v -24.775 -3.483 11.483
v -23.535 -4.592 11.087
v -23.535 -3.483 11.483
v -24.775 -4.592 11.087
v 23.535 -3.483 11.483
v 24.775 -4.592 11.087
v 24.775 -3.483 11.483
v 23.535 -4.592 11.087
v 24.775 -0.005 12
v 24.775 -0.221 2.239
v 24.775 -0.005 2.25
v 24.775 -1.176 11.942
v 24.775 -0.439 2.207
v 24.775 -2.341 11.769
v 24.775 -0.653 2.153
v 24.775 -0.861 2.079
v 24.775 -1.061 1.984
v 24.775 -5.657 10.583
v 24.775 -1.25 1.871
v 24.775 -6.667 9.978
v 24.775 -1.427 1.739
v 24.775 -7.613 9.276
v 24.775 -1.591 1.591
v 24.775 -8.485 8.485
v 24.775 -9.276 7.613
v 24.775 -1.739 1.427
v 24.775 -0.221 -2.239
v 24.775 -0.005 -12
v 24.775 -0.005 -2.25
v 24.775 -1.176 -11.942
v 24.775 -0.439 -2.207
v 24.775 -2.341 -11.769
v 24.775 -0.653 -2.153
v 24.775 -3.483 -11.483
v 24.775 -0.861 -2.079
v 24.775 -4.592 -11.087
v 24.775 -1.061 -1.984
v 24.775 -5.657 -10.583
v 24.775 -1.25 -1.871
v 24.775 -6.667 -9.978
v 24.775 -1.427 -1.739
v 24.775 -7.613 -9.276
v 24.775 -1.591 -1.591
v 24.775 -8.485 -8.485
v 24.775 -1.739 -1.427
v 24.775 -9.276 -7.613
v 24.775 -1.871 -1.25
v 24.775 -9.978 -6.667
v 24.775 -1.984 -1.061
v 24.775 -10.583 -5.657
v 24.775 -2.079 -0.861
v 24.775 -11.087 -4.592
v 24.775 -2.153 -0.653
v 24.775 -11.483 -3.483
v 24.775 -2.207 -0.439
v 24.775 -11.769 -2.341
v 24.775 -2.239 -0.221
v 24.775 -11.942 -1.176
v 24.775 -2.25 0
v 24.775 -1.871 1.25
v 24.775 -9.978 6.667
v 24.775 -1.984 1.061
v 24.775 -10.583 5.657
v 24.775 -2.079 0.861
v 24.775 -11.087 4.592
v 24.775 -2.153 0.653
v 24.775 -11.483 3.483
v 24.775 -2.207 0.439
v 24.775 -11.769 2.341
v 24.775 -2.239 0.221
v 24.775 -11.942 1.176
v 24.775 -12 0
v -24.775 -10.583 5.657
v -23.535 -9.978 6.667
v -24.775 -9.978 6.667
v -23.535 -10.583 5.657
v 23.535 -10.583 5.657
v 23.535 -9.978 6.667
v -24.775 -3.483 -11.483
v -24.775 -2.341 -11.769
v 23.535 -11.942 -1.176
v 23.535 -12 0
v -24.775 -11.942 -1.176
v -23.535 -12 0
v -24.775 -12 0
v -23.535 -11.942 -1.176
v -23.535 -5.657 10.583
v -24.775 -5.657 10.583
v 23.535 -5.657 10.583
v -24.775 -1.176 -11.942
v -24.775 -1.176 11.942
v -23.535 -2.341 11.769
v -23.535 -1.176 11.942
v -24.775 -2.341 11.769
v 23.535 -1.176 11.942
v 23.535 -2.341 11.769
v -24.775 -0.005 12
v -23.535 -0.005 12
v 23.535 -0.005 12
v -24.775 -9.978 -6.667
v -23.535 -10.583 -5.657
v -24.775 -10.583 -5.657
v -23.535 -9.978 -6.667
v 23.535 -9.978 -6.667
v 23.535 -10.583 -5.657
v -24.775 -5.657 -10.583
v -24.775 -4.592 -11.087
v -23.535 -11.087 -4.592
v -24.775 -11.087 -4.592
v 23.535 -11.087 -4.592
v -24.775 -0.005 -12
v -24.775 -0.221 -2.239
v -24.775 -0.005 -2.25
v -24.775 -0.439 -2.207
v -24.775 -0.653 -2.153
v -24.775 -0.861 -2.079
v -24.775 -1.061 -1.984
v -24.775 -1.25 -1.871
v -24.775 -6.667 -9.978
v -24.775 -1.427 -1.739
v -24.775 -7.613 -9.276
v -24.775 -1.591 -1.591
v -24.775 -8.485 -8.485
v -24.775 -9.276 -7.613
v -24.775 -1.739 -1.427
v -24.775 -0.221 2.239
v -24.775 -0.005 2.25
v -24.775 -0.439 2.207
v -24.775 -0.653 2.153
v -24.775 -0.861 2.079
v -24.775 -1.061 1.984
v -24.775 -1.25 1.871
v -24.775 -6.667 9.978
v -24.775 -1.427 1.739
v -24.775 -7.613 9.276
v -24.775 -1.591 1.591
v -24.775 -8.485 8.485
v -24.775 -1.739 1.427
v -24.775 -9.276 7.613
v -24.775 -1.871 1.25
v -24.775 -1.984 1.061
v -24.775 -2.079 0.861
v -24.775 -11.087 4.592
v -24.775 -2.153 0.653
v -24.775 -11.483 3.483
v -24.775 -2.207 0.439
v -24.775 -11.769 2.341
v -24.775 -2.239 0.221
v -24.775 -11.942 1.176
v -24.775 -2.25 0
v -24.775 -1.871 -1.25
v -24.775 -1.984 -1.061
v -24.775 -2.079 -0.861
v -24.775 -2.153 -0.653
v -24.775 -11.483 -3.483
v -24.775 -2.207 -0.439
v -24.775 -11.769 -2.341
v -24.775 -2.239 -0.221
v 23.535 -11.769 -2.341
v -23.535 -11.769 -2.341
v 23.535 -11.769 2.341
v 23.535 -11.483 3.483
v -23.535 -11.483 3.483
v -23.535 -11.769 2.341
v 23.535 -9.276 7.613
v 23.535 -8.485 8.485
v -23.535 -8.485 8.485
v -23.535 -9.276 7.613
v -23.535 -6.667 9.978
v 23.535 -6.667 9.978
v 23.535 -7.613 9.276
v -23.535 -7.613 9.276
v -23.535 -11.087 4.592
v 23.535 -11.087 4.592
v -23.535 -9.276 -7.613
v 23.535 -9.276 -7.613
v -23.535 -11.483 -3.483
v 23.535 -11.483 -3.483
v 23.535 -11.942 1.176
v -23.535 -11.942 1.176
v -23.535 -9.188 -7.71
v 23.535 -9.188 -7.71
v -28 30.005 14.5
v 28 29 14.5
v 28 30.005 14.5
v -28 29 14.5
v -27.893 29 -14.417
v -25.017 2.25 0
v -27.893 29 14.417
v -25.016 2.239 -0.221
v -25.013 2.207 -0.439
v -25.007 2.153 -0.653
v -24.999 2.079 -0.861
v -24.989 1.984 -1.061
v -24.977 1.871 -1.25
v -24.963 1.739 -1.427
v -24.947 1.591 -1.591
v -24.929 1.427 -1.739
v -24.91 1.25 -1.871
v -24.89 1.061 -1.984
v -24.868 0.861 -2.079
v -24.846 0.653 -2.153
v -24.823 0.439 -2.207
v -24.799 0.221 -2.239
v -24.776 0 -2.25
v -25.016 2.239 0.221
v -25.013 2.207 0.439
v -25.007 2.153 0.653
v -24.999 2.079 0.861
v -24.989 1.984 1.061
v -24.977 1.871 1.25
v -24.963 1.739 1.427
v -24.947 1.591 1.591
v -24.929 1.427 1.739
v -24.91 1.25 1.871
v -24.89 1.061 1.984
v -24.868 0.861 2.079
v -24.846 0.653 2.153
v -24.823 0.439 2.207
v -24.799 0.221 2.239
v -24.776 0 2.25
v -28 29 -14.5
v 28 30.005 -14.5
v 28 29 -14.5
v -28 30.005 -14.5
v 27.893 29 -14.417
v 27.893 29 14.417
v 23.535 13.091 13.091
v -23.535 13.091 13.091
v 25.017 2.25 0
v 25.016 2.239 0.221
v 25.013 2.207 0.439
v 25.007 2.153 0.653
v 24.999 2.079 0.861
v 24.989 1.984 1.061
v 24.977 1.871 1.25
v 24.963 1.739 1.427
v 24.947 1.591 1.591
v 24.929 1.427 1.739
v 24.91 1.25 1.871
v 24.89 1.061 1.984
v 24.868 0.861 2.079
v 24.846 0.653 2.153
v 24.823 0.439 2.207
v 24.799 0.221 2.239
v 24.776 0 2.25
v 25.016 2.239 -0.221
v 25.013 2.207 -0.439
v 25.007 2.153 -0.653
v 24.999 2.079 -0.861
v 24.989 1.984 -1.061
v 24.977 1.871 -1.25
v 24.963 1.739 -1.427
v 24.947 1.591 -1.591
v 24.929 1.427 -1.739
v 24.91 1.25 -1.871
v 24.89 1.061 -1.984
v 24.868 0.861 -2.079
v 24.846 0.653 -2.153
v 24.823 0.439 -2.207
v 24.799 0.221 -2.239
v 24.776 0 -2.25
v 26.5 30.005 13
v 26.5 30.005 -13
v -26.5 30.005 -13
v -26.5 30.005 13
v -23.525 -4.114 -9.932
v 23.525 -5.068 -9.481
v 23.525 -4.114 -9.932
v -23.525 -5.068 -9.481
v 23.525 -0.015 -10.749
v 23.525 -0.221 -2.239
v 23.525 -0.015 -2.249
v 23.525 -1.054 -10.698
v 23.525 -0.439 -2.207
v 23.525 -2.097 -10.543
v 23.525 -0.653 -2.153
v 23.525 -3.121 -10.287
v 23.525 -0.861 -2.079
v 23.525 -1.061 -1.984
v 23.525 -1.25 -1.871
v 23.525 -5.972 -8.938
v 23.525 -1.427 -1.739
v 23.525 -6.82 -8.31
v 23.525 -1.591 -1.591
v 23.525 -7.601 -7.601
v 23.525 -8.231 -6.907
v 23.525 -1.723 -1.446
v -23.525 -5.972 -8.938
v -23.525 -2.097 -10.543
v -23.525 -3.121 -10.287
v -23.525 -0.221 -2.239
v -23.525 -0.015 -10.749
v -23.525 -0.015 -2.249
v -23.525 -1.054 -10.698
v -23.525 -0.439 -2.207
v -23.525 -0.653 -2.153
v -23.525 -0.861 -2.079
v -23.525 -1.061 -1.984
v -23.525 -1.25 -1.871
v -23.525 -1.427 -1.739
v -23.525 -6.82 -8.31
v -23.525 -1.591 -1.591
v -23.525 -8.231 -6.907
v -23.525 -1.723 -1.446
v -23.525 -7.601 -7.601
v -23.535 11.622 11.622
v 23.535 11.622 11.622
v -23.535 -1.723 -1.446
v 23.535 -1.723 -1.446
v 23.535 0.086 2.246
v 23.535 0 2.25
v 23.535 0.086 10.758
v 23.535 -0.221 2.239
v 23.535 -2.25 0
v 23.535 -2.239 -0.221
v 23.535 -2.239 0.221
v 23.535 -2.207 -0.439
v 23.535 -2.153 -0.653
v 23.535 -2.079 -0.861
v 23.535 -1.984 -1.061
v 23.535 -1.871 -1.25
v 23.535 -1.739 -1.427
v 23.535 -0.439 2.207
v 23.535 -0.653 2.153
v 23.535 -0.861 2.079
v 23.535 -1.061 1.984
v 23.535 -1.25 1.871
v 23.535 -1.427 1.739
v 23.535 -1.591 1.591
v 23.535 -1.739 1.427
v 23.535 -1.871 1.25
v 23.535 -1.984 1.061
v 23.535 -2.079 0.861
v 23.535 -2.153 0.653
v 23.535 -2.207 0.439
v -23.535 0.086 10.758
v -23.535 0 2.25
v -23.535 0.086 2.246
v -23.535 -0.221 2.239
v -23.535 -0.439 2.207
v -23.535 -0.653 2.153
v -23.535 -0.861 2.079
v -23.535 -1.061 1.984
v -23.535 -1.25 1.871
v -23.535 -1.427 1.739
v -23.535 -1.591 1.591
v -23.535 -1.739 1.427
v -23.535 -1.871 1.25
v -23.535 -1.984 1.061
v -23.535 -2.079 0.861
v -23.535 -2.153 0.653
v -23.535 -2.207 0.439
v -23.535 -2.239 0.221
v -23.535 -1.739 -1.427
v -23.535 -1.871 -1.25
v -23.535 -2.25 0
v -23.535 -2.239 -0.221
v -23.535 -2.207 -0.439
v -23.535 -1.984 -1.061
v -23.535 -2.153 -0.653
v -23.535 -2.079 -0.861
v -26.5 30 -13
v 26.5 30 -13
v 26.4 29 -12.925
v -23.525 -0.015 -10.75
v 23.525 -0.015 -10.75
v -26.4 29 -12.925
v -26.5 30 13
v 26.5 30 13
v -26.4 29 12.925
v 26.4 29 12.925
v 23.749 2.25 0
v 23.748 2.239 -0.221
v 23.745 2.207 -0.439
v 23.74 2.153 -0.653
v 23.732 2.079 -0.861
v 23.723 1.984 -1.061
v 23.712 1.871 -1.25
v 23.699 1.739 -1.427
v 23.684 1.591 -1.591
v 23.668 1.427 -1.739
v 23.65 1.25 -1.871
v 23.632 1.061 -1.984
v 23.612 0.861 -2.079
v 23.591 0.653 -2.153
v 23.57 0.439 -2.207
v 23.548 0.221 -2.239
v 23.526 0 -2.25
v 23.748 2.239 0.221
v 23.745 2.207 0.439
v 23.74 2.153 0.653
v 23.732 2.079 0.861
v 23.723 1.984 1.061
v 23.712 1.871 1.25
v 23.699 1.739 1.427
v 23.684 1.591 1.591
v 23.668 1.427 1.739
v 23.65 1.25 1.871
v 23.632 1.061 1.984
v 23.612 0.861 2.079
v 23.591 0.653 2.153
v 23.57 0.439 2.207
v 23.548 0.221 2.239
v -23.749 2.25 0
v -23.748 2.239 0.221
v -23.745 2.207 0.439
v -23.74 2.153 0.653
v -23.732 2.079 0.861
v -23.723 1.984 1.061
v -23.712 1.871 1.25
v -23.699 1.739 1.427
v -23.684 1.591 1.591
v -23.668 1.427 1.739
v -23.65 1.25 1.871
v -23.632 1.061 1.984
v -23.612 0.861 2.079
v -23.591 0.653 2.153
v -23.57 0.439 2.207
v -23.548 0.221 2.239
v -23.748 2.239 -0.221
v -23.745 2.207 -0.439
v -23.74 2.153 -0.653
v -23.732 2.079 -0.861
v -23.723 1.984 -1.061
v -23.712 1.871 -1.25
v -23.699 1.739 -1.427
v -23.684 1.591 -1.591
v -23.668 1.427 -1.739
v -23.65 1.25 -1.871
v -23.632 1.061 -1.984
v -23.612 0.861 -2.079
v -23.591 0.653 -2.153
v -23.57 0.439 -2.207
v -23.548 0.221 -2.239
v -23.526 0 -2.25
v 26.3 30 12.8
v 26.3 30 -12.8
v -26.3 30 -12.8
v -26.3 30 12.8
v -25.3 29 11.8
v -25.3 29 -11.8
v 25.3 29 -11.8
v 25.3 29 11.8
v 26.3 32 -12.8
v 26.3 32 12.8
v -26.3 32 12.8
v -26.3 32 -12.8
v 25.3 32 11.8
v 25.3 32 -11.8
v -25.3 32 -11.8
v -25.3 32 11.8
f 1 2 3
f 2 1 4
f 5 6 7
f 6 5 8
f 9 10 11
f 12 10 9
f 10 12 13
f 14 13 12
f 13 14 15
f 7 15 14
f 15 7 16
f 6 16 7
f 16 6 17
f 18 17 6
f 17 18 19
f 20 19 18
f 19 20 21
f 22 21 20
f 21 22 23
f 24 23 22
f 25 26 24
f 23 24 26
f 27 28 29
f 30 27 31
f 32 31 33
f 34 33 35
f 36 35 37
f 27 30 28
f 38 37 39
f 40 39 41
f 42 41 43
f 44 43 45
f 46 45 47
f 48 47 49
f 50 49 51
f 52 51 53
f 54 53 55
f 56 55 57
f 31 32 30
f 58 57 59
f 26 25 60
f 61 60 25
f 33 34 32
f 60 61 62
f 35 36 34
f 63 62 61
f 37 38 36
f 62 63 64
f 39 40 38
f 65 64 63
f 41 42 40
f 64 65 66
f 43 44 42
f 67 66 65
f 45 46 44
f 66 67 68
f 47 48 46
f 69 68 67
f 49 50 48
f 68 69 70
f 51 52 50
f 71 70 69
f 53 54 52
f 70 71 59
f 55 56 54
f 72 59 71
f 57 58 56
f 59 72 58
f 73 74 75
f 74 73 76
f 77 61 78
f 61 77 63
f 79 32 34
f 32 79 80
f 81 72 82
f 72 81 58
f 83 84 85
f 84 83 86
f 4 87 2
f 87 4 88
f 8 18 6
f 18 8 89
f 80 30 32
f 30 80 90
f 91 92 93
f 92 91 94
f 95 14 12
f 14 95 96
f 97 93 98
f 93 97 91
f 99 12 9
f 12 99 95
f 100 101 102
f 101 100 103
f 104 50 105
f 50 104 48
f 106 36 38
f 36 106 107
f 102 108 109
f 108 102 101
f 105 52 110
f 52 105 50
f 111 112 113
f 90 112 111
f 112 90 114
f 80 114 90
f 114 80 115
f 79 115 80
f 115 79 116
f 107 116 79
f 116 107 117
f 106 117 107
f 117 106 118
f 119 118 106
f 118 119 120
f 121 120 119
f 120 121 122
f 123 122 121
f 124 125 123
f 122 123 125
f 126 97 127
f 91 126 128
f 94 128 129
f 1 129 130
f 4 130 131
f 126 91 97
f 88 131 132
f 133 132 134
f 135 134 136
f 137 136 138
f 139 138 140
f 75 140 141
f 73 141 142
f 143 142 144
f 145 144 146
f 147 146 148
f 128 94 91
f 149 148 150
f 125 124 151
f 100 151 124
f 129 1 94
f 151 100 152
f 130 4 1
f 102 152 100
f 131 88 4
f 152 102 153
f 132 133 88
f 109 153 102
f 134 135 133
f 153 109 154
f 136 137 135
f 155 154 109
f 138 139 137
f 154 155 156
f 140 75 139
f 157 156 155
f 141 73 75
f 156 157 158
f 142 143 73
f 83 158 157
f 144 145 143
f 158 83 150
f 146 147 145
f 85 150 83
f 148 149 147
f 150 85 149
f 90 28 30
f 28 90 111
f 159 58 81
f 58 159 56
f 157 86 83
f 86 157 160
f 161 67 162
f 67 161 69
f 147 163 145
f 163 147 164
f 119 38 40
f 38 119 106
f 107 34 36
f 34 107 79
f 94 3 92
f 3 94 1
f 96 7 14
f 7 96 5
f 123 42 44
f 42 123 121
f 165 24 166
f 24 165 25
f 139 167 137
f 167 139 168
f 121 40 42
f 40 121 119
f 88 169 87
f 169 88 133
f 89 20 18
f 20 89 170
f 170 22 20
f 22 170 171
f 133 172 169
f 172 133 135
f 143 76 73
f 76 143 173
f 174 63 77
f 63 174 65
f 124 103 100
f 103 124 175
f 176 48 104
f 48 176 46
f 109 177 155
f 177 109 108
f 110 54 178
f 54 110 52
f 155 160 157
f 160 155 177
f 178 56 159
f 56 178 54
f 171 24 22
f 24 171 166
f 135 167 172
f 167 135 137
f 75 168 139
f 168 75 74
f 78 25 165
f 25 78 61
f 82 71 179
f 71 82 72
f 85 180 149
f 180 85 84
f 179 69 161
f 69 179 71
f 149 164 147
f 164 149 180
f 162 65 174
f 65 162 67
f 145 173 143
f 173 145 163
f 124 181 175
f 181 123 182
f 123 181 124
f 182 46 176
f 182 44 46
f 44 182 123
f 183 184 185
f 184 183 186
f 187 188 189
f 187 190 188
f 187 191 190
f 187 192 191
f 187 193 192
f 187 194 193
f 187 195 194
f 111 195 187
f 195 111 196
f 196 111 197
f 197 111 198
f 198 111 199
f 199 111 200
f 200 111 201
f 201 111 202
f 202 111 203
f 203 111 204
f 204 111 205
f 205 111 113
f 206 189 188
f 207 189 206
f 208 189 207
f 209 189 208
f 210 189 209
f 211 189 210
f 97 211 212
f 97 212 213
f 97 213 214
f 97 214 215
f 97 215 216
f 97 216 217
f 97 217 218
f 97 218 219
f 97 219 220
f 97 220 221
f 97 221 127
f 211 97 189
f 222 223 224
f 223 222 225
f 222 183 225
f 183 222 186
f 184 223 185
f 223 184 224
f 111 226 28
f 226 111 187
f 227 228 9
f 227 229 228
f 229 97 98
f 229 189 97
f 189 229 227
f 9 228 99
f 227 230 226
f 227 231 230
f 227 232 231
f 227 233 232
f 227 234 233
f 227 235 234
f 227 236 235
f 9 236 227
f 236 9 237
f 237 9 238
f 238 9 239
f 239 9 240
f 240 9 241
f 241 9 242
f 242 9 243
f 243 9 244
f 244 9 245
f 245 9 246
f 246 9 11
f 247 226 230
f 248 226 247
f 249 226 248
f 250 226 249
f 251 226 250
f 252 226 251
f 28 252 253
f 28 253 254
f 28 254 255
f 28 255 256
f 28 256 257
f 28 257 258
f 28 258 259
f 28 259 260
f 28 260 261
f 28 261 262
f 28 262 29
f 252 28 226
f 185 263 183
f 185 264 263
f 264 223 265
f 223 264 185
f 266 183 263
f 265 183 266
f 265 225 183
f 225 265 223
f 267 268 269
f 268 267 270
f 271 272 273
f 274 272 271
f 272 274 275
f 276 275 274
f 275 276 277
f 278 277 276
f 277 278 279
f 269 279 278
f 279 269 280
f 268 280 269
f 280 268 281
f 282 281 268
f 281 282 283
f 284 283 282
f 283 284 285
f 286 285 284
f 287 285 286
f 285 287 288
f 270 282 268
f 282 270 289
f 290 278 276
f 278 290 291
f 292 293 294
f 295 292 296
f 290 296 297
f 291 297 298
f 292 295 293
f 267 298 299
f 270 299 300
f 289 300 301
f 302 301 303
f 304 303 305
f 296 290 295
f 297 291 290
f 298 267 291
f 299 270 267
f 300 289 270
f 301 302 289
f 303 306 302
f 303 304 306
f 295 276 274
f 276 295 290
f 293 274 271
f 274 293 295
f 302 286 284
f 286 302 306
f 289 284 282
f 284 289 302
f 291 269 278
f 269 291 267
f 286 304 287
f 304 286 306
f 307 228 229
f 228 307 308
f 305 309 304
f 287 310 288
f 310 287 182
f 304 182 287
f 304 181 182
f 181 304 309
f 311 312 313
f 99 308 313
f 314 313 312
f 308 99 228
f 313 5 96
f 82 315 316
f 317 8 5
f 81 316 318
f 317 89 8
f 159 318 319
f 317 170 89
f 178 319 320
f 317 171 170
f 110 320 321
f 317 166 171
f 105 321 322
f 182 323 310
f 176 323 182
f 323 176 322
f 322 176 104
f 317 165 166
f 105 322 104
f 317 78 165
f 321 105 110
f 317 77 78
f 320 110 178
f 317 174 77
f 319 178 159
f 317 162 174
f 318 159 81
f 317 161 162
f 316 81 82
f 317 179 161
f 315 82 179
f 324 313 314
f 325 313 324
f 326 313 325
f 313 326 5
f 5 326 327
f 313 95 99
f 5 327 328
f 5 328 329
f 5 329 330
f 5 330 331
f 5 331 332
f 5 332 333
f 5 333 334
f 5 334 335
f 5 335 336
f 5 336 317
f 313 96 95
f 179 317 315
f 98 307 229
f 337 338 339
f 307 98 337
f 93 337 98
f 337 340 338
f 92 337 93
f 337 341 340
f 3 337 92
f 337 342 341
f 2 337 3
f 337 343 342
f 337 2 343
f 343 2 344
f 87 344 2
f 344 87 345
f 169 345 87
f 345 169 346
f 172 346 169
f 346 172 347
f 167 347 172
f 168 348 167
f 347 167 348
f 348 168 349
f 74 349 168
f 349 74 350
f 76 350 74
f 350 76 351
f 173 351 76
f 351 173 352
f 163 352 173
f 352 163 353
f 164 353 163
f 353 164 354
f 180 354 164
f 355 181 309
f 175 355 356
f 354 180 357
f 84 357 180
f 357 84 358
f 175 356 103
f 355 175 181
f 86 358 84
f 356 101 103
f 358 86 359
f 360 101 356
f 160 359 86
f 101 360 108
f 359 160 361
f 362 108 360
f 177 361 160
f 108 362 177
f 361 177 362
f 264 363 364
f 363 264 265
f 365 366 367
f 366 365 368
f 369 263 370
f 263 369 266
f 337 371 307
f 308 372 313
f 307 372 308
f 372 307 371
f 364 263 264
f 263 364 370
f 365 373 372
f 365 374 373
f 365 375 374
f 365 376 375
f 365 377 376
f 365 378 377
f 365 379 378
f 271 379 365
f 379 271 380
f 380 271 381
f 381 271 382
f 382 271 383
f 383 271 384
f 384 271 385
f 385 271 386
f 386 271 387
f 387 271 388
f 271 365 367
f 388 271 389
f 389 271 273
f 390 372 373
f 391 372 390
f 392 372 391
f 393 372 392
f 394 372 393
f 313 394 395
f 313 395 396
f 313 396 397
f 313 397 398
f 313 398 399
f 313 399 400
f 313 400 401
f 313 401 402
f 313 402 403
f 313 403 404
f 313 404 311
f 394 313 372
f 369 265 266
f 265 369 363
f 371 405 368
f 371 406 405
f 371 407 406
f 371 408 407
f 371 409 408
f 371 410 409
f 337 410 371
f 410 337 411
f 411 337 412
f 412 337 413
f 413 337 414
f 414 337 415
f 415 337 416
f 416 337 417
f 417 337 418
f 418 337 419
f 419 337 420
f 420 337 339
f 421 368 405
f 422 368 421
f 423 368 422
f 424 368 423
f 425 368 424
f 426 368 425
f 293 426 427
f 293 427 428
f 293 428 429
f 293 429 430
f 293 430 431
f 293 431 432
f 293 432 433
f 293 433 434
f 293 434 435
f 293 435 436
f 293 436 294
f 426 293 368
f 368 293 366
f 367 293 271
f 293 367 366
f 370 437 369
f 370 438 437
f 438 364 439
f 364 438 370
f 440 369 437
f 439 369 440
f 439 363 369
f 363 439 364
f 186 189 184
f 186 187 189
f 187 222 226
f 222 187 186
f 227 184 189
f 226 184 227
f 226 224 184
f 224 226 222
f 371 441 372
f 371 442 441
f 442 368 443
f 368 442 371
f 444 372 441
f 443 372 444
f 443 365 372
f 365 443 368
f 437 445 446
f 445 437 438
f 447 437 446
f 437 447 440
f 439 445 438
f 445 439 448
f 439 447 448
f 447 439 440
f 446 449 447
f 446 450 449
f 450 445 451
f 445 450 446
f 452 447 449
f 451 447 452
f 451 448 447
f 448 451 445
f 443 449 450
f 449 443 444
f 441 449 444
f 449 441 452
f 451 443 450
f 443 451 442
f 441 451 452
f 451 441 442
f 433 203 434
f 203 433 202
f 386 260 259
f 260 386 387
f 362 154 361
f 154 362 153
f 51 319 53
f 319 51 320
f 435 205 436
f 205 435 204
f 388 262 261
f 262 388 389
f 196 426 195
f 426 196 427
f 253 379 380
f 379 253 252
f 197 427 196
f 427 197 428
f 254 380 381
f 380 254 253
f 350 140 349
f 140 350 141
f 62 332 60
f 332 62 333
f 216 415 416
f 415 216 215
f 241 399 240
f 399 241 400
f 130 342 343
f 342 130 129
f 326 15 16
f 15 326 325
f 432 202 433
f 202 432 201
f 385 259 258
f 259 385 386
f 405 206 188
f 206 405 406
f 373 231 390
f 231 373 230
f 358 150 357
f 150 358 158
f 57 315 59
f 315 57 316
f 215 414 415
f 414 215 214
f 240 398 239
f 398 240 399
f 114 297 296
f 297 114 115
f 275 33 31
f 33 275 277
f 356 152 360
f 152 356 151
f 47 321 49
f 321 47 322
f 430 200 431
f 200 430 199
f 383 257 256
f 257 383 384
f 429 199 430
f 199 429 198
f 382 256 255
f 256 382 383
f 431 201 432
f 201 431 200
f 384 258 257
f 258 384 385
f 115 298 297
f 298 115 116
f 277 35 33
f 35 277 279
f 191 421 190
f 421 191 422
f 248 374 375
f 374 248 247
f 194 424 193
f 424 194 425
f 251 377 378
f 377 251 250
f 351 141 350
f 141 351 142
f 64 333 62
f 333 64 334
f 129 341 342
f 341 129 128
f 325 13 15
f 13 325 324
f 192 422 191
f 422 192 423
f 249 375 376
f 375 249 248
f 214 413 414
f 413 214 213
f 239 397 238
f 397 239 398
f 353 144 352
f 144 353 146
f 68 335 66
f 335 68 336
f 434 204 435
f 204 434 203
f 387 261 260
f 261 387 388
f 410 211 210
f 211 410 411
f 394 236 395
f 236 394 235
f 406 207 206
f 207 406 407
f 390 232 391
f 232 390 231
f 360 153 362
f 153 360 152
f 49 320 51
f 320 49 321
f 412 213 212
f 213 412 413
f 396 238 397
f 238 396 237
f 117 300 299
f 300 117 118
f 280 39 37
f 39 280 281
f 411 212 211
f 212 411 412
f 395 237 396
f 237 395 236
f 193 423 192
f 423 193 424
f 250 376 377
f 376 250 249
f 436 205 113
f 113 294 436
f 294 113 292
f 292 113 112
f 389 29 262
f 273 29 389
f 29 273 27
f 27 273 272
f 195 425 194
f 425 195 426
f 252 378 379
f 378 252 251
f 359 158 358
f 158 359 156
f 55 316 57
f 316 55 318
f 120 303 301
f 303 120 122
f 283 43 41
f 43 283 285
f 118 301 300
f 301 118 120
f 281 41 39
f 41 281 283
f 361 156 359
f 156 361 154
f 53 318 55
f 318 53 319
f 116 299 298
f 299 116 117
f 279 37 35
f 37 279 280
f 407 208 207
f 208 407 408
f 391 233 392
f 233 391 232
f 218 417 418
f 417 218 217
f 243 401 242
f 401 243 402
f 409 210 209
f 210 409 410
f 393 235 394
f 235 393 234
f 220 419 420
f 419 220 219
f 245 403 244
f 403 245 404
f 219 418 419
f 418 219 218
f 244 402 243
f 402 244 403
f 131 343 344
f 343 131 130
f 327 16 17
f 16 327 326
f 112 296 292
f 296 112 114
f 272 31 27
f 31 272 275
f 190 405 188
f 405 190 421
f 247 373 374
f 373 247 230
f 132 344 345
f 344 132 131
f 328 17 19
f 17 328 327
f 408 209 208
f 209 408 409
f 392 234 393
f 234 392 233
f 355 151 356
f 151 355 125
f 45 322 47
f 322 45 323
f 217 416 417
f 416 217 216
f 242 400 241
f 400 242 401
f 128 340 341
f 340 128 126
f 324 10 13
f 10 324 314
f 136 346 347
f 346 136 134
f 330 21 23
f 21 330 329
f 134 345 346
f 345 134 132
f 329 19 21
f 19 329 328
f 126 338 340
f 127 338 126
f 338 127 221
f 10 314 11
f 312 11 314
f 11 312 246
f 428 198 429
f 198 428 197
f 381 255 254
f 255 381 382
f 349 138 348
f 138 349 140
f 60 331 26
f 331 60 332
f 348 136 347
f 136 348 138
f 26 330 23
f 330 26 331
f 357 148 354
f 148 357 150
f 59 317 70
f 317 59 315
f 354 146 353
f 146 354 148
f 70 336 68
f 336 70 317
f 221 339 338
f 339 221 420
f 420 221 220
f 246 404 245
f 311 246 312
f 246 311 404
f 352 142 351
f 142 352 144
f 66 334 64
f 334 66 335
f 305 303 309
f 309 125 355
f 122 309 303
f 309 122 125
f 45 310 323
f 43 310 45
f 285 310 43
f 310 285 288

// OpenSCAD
// Articulated rectangular cable channel

OUTPUT = "arm_2"; // "assembly", "arm_1", "arm_2", or "print"

CHANNEL_ANGLE = 75;

// Angles are measured from each arm's centerline in the positive bend direction.
ARM_1_HUB_OPENING_START_ANGLE =50;
ARM_1_HUB_OPENING_END_ANGLE = 180;
ARM_2_HUB_OPENING_START_ANGLE = 45;
ARM_2_HUB_OPENING_END_ANGLE = 220;

ARM_1_LENGTH = 25;
ARM_1_WIDTH = 40;
ARM_1_HEIGHT = 14;
ARM_1_WALL_THICKNESS = 1;
ARM_1_LIP_LENGTH = 0;
ARM_1_LIP_WALL_THICKNESS = 1;
ARM_1_LIP_CLEARANCE = 0.2;

ARM_2_LENGTH = 30;
ARM_2_WIDTH = 56;
ARM_2_HEIGHT = 29;
ARM_2_WALL_THICKNESS = 1.5;
ARM_2_LIP_LENGTH = 2;
ARM_2_LIP_WALL_THICKNESS = 1;
ARM_2_LIP_CLEARANCE = 0.2;

BOLT_HOLE_DIAMETER = 4.5;
BOLT_HOLE_CUT_MARGIN = 10;
HUB_OPENING_CUT_MARGIN = 20;
HUB_FIT_DELTA = 0.3;
JOINT_RADIAL_CLEARANCE = 0.3;

$fn = 64;

EPSILON = 0.01;
HUB_WIDTH = (ARM_1_WIDTH + ARM_2_WIDTH) / 2;
HUB_WALL_THICKNESS =
  (ARM_1_WALL_THICKNESS + ARM_2_WALL_THICKNESS) / 2;
HUB_DIAMETER = (ARM_1_HEIGHT + ARM_2_HEIGHT) / 2;
INNER_HUB_WIDTH = HUB_WIDTH - HUB_WALL_THICKNESS - HUB_FIT_DELTA;
OUTER_HUB_WIDTH = HUB_WIDTH + HUB_WALL_THICKNESS + HUB_FIT_DELTA;
FORK_WIDTH = OUTER_HUB_WIDTH;
FORK_GAP = INNER_HUB_WIDTH + 2 * HUB_FIT_DELTA;
FORK_CHEEK_THICKNESS = (FORK_WIDTH - FORK_GAP) / 2;
HUB_SIDE_THICKNESS = HUB_WALL_THICKNESS;

INNER_HUB_OUTER_DIAMETER = HUB_DIAMETER - 2 * JOINT_RADIAL_CLEARANCE;
INNER_HUB_INNER_DIAMETER =
  INNER_HUB_OUTER_DIAMETER - 2 * HUB_WALL_THICKNESS;
OUTER_HUB_INNER_DIAMETER =
  INNER_HUB_OUTER_DIAMETER + 2 * JOINT_RADIAL_CLEARANCE;
OUTER_HUB_OUTER_DIAMETER =
  OUTER_HUB_INNER_DIAMETER + 2 * HUB_WALL_THICKNESS;

FORK_RADIUS = OUTER_HUB_OUTER_DIAMETER / 2;
INNER_HUB_OUTER_RADIUS = INNER_HUB_OUTER_DIAMETER / 2;

assert(OUTPUT == "assembly" || OUTPUT == "arm_1" ||
       OUTPUT == "arm_2" || OUTPUT == "print",
       "OUTPUT must be assembly, arm_1, arm_2, or print");
assert(CHANNEL_ANGLE > 0 && CHANNEL_ANGLE < 180,
       "CHANNEL_ANGLE must be between 0 and 180 degrees");
assert(ARM_1_HUB_OPENING_START_ANGLE >= 0 &&
       ARM_1_HUB_OPENING_END_ANGLE <= 360 &&
       ARM_1_HUB_OPENING_START_ANGLE < ARM_1_HUB_OPENING_END_ANGLE,
       "ARM_1 hub opening must define an increasing range within 0..360");
assert(ARM_2_HUB_OPENING_START_ANGLE >= 0 &&
       ARM_2_HUB_OPENING_END_ANGLE <= 360 &&
       ARM_2_HUB_OPENING_START_ANGLE < ARM_2_HUB_OPENING_END_ANGLE,
       "ARM_2 hub opening must define an increasing range within 0..360");
assert(BOLT_HOLE_DIAMETER > 0,
       "BOLT_HOLE_DIAMETER must be positive");
assert(HUB_FIT_DELTA >= 0,
       "HUB_FIT_DELTA cannot be negative");
assert(FORK_CHEEK_THICKNESS > 0,
       "The outer hub is too narrow to contain the inner hub");
assert(HUB_SIDE_THICKNESS > 0 &&
       2 * HUB_SIDE_THICKNESS < INNER_HUB_WIDTH,
       "HUB_SIDE_THICKNESS leaves no hollow space in the inner hub");
assert(INNER_HUB_INNER_DIAMETER > BOLT_HOLE_DIAMETER,
       "The inner hub is too small for the requested bolt hole");
assert(ARM_1_LENGTH > INNER_HUB_OUTER_RADIUS &&
       ARM_2_LENGTH > FORK_RADIUS,
       "Arm lengths must exceed their hub radii");

module validate_arm(name, width, height, wall_thickness,
                    lip_length, lip_wall_thickness, lip_clearance) {
  lip_outer_width = width - 2 * wall_thickness - 2 * lip_clearance;
  lip_outer_height = height - 2 * wall_thickness - 2 * lip_clearance;

  assert(wall_thickness > 0, str(name, " wall thickness must be positive"));
  assert(width > 2 * wall_thickness,
         str(name, " width must be greater than twice its wall thickness"));
  assert(height > 2 * wall_thickness,
         str(name, " height must be greater than twice its wall thickness"));
  assert(lip_length >= 0, str(name, " lip length cannot be negative"));
  assert(lip_wall_thickness > 0,
         str(name, " lip wall thickness must be positive"));
  assert(lip_clearance >= 0, str(name, " lip clearance cannot be negative"));
  assert(lip_outer_width > 2 * lip_wall_thickness,
         str(name, " lip is too thick for the available internal width"));
  assert(lip_outer_height > 2 * lip_wall_thickness,
         str(name, " lip is too thick for the available internal height"));
}

module profile(width, height, y) {
  translate([-width / 2, y - EPSILON / 2, -height / 2])
  cube([width, EPSILON, height]);
}

module tapered_prism(start_y, end_y, start_width, start_height,
                     end_width, end_height) {
  hull() {
    profile(start_width, start_height, start_y);
    profile(end_width, end_height, end_y);
  }
}

module x_cylinder(diameter, length) {
  rotate([0, 90, 0])
  cylinder(d = diameter, h = length, center = true);
}

module ring_sector_x(inner_radius, outer_radius, width,
                     start_angle, end_angle) {
  rotate([0, 90, 0])
  rotate([0, 0, start_angle + 90])
  rotate_extrude(angle = end_angle - start_angle, convexity = 10)
  translate([inner_radius, -width / 2])
  square([outer_radius - inner_radius, width]);
}

module connector_lip(length, width, height, wall_thickness,
                     lip_length, lip_wall_thickness, lip_clearance) {
  lip_outer_width = width - 2 * wall_thickness - 2 * lip_clearance;
  lip_outer_height = height - 2 * wall_thickness - 2 * lip_clearance;
  lip_inner_width = lip_outer_width - 2 * lip_wall_thickness;
  lip_inner_height = lip_outer_height - 2 * lip_wall_thickness;

  if (lip_length > 0) {
    difference() {
      union() {
        translate([-width / 2, length - lip_wall_thickness, -height / 2])
        cube([width, lip_wall_thickness, height]);

        translate([
          -lip_outer_width / 2,
          length - EPSILON,
          -lip_outer_height / 2
        ])
        cube([lip_outer_width, lip_length + EPSILON, lip_outer_height]);
      }

      translate([
        -lip_inner_width / 2,
        length - lip_wall_thickness - EPSILON,
        -lip_inner_height / 2
      ])
      cube([
        lip_inner_width,
        lip_length + lip_wall_thickness + 2 * EPSILON,
        lip_inner_height
      ]);
    }
  }
}

module inner_hub() {
  cavity_width = INNER_HUB_WIDTH - 2 * HUB_SIDE_THICKNESS;

  difference() {
    union() {
      x_cylinder(INNER_HUB_OUTER_DIAMETER, INNER_HUB_WIDTH);
      tapered_prism(
        0,
        ARM_1_LENGTH,
        INNER_HUB_WIDTH,
        INNER_HUB_OUTER_DIAMETER,
        ARM_1_WIDTH,
        ARM_1_HEIGHT
      );
    }

    x_cylinder(INNER_HUB_INNER_DIAMETER, cavity_width);

    ring_sector_x(
      0,
      INNER_HUB_OUTER_RADIUS + HUB_OPENING_CUT_MARGIN,
      cavity_width + 2 * EPSILON,
      ARM_1_HUB_OPENING_START_ANGLE,
      ARM_1_HUB_OPENING_END_ANGLE
    );

    tapered_prism(
      -EPSILON,
      ARM_1_LENGTH + EPSILON,
      cavity_width,
      INNER_HUB_INNER_DIAMETER,
      ARM_1_WIDTH - 2 * ARM_1_WALL_THICKNESS,
      ARM_1_HEIGHT - 2 * ARM_1_WALL_THICKNESS
    );

  }
}

module fork_hub() {
  difference() {
    union() {
      x_cylinder(OUTER_HUB_OUTER_DIAMETER, FORK_WIDTH);
      tapered_prism(
        0,
        ARM_2_LENGTH,
        FORK_WIDTH,
        OUTER_HUB_OUTER_DIAMETER,
        ARM_2_WIDTH,
        ARM_2_HEIGHT
      );
    }

    // The bore receives ARM_1's rotating central hub.
    x_cylinder(OUTER_HUB_INNER_DIAMETER, FORK_GAP);

    ring_sector_x(
      0,
      FORK_RADIUS + HUB_OPENING_CUT_MARGIN,
      FORK_GAP + 2 * EPSILON,
      ARM_2_HUB_OPENING_START_ANGLE,
      ARM_2_HUB_OPENING_END_ANGLE
    );

    tapered_prism(
      -EPSILON,
      ARM_2_LENGTH + EPSILON,
      FORK_GAP,
      OUTER_HUB_OUTER_DIAMETER - 2 * HUB_WALL_THICKNESS,
      ARM_2_WIDTH - 2 * ARM_2_WALL_THICKNESS,
      ARM_2_HEIGHT - 2 * ARM_2_WALL_THICKNESS
    );

  }
}

module arm_1_part() {
  difference() {
    union() {
      inner_hub();
      connector_lip(
        ARM_1_LENGTH,
        ARM_1_WIDTH,
        ARM_1_HEIGHT,
        ARM_1_WALL_THICKNESS,
        ARM_1_LIP_LENGTH,
        ARM_1_LIP_WALL_THICKNESS,
        ARM_1_LIP_CLEARANCE
      );
    }

    x_cylinder(
      BOLT_HOLE_DIAMETER,
      INNER_HUB_WIDTH + 2 * BOLT_HOLE_CUT_MARGIN
    );
  }
}

module arm_2_part() {
  difference() {
    union() {
      fork_hub();
      connector_lip(
        ARM_2_LENGTH,
        ARM_2_WIDTH,
        ARM_2_HEIGHT,
        ARM_2_WALL_THICKNESS,
        ARM_2_LIP_LENGTH,
        ARM_2_LIP_WALL_THICKNESS,
        ARM_2_LIP_CLEARANCE
      );
    }

    x_cylinder(
      BOLT_HOLE_DIAMETER,
      FORK_WIDTH + 2 * BOLT_HOLE_CUT_MARGIN
    );
  }
}

validate_arm(
  "ARM_1", ARM_1_WIDTH, ARM_1_HEIGHT, ARM_1_WALL_THICKNESS,
  ARM_1_LIP_LENGTH, ARM_1_LIP_WALL_THICKNESS, ARM_1_LIP_CLEARANCE
);
validate_arm(
  "ARM_2", ARM_2_WIDTH, ARM_2_HEIGHT, ARM_2_WALL_THICKNESS,
  ARM_2_LIP_LENGTH, ARM_2_LIP_WALL_THICKNESS, ARM_2_LIP_CLEARANCE
);

if (OUTPUT == "assembly") {
  rotate([-CHANNEL_ANGLE, 180, 0])
  arm_1_part();
  arm_2_part();
} else if (OUTPUT == "arm_1") {
  arm_1_part();
} else if (OUTPUT == "arm_2") {
  arm_2_part();
} else if (OUTPUT == "print") {
  translate([0, 0, INNER_HUB_OUTER_RADIUS])
  arm_1_part();

  translate([
    0,
    ARM_1_LENGTH + ARM_2_LENGTH + HUB_DIAMETER,
    max(FORK_RADIUS, ARM_2_HEIGHT / 2)
  ])
  arm_2_part();
}
